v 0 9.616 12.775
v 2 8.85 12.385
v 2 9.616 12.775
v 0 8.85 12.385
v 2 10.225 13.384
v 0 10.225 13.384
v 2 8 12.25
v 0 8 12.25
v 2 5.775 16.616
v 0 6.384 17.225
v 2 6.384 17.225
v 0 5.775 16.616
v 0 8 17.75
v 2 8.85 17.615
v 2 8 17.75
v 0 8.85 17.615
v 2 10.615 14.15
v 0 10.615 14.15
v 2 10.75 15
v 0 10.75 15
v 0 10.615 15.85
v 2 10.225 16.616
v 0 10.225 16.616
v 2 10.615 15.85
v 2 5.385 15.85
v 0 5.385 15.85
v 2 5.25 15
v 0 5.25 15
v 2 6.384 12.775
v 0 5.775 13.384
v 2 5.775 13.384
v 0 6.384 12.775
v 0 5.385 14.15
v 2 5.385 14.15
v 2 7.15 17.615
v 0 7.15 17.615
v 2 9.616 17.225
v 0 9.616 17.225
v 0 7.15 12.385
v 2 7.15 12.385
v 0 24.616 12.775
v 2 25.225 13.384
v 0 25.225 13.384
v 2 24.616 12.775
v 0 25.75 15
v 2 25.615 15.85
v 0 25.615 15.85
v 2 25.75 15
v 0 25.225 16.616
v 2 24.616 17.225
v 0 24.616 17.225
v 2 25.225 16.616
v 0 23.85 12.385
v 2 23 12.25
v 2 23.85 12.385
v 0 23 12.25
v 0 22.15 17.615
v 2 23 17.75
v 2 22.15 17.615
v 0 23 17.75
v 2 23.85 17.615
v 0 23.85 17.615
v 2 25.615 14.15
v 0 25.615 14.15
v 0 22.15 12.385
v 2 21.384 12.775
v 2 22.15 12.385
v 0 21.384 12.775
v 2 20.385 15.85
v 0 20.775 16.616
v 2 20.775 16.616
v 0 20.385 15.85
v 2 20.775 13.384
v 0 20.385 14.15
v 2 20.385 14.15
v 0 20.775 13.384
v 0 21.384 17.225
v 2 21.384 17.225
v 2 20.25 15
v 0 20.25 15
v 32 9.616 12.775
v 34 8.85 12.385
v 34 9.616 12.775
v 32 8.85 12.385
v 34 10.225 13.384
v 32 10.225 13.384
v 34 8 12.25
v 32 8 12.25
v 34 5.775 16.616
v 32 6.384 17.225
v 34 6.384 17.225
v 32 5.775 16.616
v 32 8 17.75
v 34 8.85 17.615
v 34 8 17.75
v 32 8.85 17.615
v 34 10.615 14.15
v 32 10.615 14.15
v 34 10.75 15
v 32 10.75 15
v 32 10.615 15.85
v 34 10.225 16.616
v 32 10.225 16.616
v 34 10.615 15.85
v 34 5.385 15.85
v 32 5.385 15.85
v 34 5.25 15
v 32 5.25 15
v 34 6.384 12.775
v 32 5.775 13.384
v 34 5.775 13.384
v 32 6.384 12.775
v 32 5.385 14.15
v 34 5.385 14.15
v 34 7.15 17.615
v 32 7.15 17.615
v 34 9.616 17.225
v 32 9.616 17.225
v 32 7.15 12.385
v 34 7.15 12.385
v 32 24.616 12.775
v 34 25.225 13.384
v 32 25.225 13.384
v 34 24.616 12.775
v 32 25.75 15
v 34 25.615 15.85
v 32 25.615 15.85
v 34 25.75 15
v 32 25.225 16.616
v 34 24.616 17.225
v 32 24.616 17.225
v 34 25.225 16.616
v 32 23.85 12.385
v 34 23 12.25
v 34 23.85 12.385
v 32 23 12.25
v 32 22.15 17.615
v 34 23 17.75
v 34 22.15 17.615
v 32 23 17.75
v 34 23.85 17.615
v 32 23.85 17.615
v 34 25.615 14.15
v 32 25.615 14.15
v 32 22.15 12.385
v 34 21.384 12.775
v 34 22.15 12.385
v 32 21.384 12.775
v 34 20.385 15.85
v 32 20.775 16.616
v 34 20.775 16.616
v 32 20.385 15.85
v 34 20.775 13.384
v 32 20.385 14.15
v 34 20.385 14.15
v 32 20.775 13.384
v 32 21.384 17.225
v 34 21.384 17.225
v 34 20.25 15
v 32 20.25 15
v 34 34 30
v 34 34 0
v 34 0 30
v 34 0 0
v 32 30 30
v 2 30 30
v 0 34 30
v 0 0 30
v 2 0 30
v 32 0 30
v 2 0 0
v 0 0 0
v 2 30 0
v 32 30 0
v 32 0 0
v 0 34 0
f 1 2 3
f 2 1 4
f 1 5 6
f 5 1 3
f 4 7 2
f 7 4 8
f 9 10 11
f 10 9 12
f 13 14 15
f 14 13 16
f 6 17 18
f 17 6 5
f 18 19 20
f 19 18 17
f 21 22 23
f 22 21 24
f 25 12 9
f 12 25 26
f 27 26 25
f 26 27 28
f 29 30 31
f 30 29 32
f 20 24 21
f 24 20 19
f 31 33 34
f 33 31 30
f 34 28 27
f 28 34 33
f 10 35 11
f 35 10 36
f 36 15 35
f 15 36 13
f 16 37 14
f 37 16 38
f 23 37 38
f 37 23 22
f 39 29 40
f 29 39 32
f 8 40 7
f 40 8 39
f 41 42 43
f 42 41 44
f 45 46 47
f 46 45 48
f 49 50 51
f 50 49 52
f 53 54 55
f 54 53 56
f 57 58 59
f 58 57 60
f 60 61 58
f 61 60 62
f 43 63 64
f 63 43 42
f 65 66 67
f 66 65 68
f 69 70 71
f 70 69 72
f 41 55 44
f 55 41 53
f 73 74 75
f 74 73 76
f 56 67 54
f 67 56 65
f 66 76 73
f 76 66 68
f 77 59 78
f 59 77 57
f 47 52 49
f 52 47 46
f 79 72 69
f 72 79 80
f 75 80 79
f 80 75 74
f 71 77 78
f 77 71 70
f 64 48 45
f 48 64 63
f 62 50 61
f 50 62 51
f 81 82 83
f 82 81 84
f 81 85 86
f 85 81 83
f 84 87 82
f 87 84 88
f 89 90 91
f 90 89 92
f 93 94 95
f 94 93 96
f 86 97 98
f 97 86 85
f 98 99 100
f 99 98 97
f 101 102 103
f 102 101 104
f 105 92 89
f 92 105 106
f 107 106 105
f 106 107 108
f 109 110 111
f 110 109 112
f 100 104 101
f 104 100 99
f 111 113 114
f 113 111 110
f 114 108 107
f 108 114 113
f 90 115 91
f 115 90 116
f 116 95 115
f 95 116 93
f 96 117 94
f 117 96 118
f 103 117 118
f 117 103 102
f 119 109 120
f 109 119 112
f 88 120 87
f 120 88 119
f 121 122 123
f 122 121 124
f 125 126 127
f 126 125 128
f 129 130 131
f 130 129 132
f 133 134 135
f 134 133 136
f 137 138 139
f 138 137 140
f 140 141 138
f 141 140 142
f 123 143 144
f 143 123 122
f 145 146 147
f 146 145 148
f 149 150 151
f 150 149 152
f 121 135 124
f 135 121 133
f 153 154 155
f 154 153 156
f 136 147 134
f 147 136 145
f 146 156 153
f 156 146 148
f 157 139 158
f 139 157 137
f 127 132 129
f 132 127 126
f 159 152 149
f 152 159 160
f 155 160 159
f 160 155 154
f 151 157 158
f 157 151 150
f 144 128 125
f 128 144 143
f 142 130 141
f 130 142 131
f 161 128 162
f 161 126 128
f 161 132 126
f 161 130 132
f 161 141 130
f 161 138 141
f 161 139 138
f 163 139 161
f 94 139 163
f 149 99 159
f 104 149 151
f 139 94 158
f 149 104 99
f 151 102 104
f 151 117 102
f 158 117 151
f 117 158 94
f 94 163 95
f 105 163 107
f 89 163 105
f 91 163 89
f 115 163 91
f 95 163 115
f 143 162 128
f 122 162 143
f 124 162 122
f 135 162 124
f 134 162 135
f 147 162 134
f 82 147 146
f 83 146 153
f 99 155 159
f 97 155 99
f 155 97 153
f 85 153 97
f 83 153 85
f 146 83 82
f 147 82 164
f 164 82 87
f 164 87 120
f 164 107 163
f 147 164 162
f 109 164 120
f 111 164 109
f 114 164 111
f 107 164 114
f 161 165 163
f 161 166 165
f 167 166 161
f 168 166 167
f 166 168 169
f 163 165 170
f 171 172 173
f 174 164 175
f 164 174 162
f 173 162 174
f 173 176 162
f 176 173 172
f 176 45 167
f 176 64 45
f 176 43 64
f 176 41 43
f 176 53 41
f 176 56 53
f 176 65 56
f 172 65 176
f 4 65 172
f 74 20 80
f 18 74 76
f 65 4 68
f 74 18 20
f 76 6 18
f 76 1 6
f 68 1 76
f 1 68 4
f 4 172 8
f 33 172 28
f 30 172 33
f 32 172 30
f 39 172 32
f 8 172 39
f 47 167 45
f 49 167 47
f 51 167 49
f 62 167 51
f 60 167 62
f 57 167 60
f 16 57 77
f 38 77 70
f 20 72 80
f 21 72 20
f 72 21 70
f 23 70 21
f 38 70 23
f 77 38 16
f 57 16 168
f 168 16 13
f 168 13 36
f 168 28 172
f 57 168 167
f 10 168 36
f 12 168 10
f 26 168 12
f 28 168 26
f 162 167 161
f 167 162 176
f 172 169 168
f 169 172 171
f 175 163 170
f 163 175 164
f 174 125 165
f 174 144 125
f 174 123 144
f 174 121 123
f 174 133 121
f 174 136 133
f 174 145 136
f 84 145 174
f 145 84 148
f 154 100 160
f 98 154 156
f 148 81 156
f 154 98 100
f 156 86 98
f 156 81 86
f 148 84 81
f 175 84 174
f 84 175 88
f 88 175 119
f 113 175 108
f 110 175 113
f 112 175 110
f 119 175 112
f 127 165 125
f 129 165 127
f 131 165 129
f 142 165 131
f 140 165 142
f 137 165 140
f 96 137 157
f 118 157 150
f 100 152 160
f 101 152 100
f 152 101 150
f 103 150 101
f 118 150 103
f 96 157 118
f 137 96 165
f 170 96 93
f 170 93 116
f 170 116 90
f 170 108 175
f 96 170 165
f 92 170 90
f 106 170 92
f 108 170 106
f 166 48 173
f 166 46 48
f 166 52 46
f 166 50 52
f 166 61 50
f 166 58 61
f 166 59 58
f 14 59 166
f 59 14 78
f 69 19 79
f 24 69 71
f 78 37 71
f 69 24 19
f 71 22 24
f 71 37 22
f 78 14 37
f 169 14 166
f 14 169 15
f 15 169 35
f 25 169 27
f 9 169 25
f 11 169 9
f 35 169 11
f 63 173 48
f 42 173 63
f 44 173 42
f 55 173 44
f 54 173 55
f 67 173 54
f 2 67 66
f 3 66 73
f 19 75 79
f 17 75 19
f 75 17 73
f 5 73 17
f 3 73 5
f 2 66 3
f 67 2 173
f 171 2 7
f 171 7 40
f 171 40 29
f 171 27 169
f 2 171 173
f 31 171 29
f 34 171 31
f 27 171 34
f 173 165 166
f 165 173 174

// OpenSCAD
// file: ../../parameters.scad
//Main tube diameter - hole [mm]
main_tube_outer_diameter = 25.4;
main_tube_inner_diameter = 23.05;

//Tube for undercarriage - rendered hole [mm]
tube_for_undercarriage_outer_diameter = 10.6;
tube_for_undercarriage_inner_diameter = 6;
global_clearance = 0.5;


// Nastavení parametrů rotoru

gliding_aggle = 14;         // tenhle úhel by se zřejmě v budoucnu měl počítat z požadované klouzavosti.


rotor_blade_AOA = 1.5;      // nastavení úhlu náběhu rotorového listu
rotor_blade_length = 970;   // délka rotorového listu
rotor_blade_depth = 50;     // hloubka rotorového listu

// nastavení parametrů motoru

engine_angle = -8;
engine_diameter = 55;
engine_offset = 55;

engine_screws_radius = 15;
engine_holes_radius = (24 + 44)/4;
engine_shatf_hole_diameter = 13;

// Parameters of tube couplings
coupling_wall_thickness = main_tube_outer_diameter/5;  //width of coupling walls
thickness_between_tubes = main_tube_outer_diameter/10;    // minimum distance between tubes in couplings

coupling_wall_thickness_undercarriage = tube_for_undercarriage_outer_diameter/3;
thickness_between_tubes_undercarriage = tube_for_undercarriage_outer_diameter/10;

608_bearing_outer_diameter = 22.3;
608_bearing_thickness = 7.1;


// screw length step - minimum difference in length between two types of screws
basic_screw_length = 5;


//Screw diameter and nut for M10 [mm]
M10_screw_diameter=10.4;
M10_head_height = 10;
M10_head_diameter = 16+0.5;
M10_nut_height = 10.5;
M10_nut_diameter = 25.5;
M10_nut_pocket = 22.3;

//Screw diameter for M8 [mm]
M8_screw_diameter = 8.6;
M8_head_height = 8;
M8_head_diameter = 13.5;
M8_nut_height = 7.5;
M8_nut_diameter = 14.4 + 0.5;
M8_nut_pocket = 13 + 0.5;

//Screw diameter and nut for M6 [mm]
M6_screw_diameter=6.5;
M6_head_diameter = 10+0.5;
M6_head_height = 6;
M6_nut_height = 4.9;
M6_nut_diameter = 11.8;
M6_nut_pocket = 10.4;

//Screw diameter and nut for M5 [mm]
M5_screw_diameter=5.5;
M5_head_height = 5;
M5_head_diameter = 13+0.5;
M5_nut_height = 4.5;
M5_nut_diameter = 9.4;
M5_nut_pocket = 8.4;

//Screw diameter and nut for M4 [mm]
M4_screw_diameter=4.5;
M4_screw_head_height = 4;
M4_nut_height = 3.2;
M4_nut_diameter = 8.4;
M4_nut_pocket = 7.5;

//Screw diameter and nut for M3 [mm]
M3_screw_diameter = 3.2;
M3_nut_height = 2.7;
M3_nut_diameter = 6.6;
M3_screw_head_height = 3;

//Screw diameter and nut for M2,5 [mm]
M2_5_screw_diameter = 2.7;
M2_5_nut_height = 2.3;
M2_5_nut_diameter = 6;
M2_5_nut_pocket = 5.5;


//šroub servo
Servo_screw = 1.5;

//The tube for help
Help_main_tube_outer = 25;
Help_main_tube_inner = 23;
Help_tube_for_undercarriage_outer = 10;
Help_tube_for_undercarriage_inner = 5;


//main hull parameters

hull_drop_length = 580;
hull_wall_thickness = 0.8;
hull_y_size = 120;
hull_z_size = 150;
hull_x_size = 580;
hull_corner_radius = 4;
hull_airfoil_thickness= 35;  // thickness of drop generating airfoil in percent of length.
hull_scale_x = 1;
hull_scale_y = 1.5;
hull_scale_z = 1.5;

main_pilon_position = 170+68+30;       // pozice rotorového pilonu měřená od přední části krytu
cover_pilon_position = 180;
height_of_vertical_tube = 275; //278mm je změřená délka trubky.

//délka hlavní dlouhé trubky
length_of_main_tube = 820;
length_of_undercarriage_tube = 300;

ribbon_width = 5; // šířka vyztužovacích lemů.

// šířka otvoru v přední části kapoty pro držák motoru.
width_of_engine_holder = 63;

//Top Cover Division - dělení horního krytu pro tisk
top_cover_division = [0, 50, 150, 280, 410, hull_x_size]; // upraveny seznam tak, aby deleni začinalo od nuly, což umožňí úplně automatické rozdělení.

//Bottom Cover Division - dělení dolního krytu pro tisk
bottom_cover_division = [0,100,232.5,365, 470, hull_x_size];
// zkrácená část pro payload pro testovací tisk
//bottom_cover_division = [0,200,250,365, 470, hull_x_size];




rotor_height = height_of_vertical_tube + main_tube_outer_diameter/2 + 2*global_clearance + thickness_between_tubes + 30; // změřená výška rotoru je 367mm
center_of_gravity_position = [main_pilon_position - tan(gliding_aggle)*rotor_height, 0, 0];



//Cover pilon division - na výšku (v ose Z)
cover_pilon_division = [0,170,height_of_vertical_tube + main_tube_outer_diameter + coupling_wall_thickness];

//pozice šroubů
	//horní kryt
top_screw_position = [0,
                    (top_cover_division[0] + top_cover_division[1])/2,
                    (top_cover_division[2] - top_cover_division[1])/2 + top_cover_division[1],
                    (top_cover_division[3] - top_cover_division[2])/2 + top_cover_division[2],
                    (top_cover_division[4] - top_cover_division[3])/8 + top_cover_division[3],
                    (top_cover_division[5] - top_cover_division[4])/2 + top_cover_division[4] - top_cover_division[1]/3];
	//spodní kryt
bottom_screw_position = [0,
                        (bottom_cover_division[0] + bottom_cover_division[1])*(2/6),
                        bottom_cover_division[1]*(9/10),
                        bottom_cover_division[3] + bottom_cover_division[1]*(1/10),
                        bottom_cover_division[3] + bottom_cover_division[1]*(3/5)];




//šířka zámků
lock_width = 10;

//délka zámků
lock_length = 3;


//accumulator
//základní rozměry akumulátoru
width_of_accumulator = 129.4;//45+1;
depth_of_accumulator = 40.61;
height_of_accumulator = 43.65;
//Zapuštění akumulátoru
sink_of_accumulator = 5; //main_tube_outer_diameter/5 - M3_nut_height*1.5;

//tloušťka hrany spojky
accumulator_holder_width = 18;
accumulator_holder_thickness = 10;

//posunutí akumálátoru na podložce
move_of_accumulator = 75;   // pozice akumulátoru (ovlivňuje těžiště)


////////////////
// Senzory
///////////////////

//opticalFlow
width_optical_flow_senzor = 45.5;
depth_optical_flow_senzor = 6;
height_optical_flow_senzor = 35;
sink_of_optical_flow_senzor = depth_optical_flow_senzor - 5;
M3_optical_flow_senzor_Z = 30.4;
M3_optical_flow_senzor_X = 24;
M3_optical_flow_senzor_Z_alone = 9.1;
M3_optical_flow_senzor_X_alone = 16.7;

//GPS anténa
GPS_outer_length = 48.01;   //Vnější rozměr
GPS_inner_length = 37.48;   //Vnitřní rozměr
GPS_diameter = (GPS_outer_length - GPS_inner_length)/2;    //Průměr otvoru
GPS_middle_length = GPS_diameter + GPS_inner_length;      //Střední rozměr


////podzvozek

radius_undercarriage = 25;
vzdalenost_x = tan(20) * 131;
vzdalenost_y = (131 - radius_undercarriage)/tan(79);
uhel_y = 90 - 20;
uhel_x = 90 - 79;

maximum_printable_size = 150;


////Pitotova trubice
Pitot_tube_diameter = 4.02 + 1;
Distance_hole_from_tube = 11.92;  //vzdálenost otvoru pro připevnění od samotné trubičky


////směrové kormidlo
Rudder_length = 4*main_tube_outer_diameter;
Rudder_height = 2*main_tube_outer_diameter;
Rudder_depth = main_tube_outer_diameter/2;
gap_width = 2*hull_wall_thickness;      //šířka mezery mezi směrovkou a ocasní plochou
ruder_shaft_diameter = 2.6; //otočné uchycení směrovky - průměr 2 mm


/////spojka 666_1004

    width_666_1004 = (main_tube_outer_diameter+2*coupling_wall_thickness - M3_screw_head_height)/basic_screw_length;
//        echo("width_666_1004 is", width_666_1004);

//        echo("ceil_666_1004 is", ceil(width_666_1004));

    coupling_screw_length_666_1004 = (ceil(width_666_1004)) * basic_screw_length;
        echo("coupling_screw_length_666_1004 is", coupling_screw_length_666_1004);

    coupling_width_666_1004 = coupling_screw_length_666_1004 + M3_screw_head_height;
//        echo("coupling_width_666_1004 is", coupling_width_666_1004);

    height_666_1004 = coupling_width_666_1004;
//        echo("height_666_1004 is", height_666_1004);

    depth_666_1004 = main_tube_outer_diameter*2+2*coupling_wall_thickness+thickness_between_tubes;
//        echo("depth_666_1004 is", depth_666_1004);

    depth_666_1004_drillhelper = main_tube_outer_diameter*3;

/////spojka 666_1026



    width_666_1026 = main_tube_outer_diameter + 2*thickness_between_tubes;

    depth_666_1026 = (main_tube_outer_diameter*2)/basic_screw_length;
//        echo("depth_666_1026 is", depth_666_1026);

//        echo("ceil_666_1026 is", ceil(depth_666_1026));

    coupling_screw_length_666_1026 = (ceil(depth_666_1026)) * basic_screw_length;
        echo("coupling_screw_length_666_1026 is", coupling_screw_length_666_1026);


    thickness_of_plate = coupling_screw_length_666_1026 - M4_screw_head_height - 50; //50 mm je konstatní šířka spojky 666_1026
    echo("thickness_of_plate is", thickness_of_plate);

    coupling_depth_666_1026 = coupling_screw_length_666_1026 - M4_screw_head_height - thickness_of_plate;      //zde je odečten M4_screw_head_height pro určení šířky, tak aby šroub přesahoval pro potřebnou matku
//        echo("coupling_depth_666_1026 is", coupling_depth_666_1026);

    height_666_1026 = 2*main_tube_outer_diameter;
//        echo("height_666_1026 is", height_666_1026);

//tloušťka plechu pro zajištění konstatní šířky spojky 50 mm

    width_666_1026_drillhelper = main_tube_outer_diameter*2;

    depth_666_1026_drillhelper = main_tube_outer_diameter + 4*thickness_between_tubes;


////spojka 666_1017

    width_666_1017 = (main_tube_outer_diameter + 4*coupling_wall_thickness - M3_screw_head_height)/basic_screw_length;
//        echo("width_666_1017 is", width_666_1017);

//        echo("ceil_666_1017 is", ceil(width_666_1017));

    coupling_screw_length_666_1017 = (ceil(width_666_1017)) * basic_screw_length;
        echo("coupling_screw_length_666_1017 is", coupling_screw_length_666_1017);

    coupling_width_666_1017 = coupling_screw_length_666_1017 + M3_screw_head_height;
//        echo("coupling_width_666_1017 is", coupling_width_666_1017);

    depth_666_1017 = coupling_width_666_1017;

    height_666_1017= 70; //main_tube_outer_diameter*1.8+main_tube_outer_diameter+wall_thickness;

    width_666_1017_drillhelper = main_tube_outer_diameter+4*thickness_between_tubes;

    depth_666_1017_drillhelper = main_tube_outer_diameter*2;


////spojka 666_1014

    width_666_1014 = tube_for_undercarriage_outer_diameter + 2*coupling_wall_thickness_undercarriage;

    depth_666_1014 = tube_for_undercarriage_outer_diameter + M3_screw_diameter + 2*coupling_wall_thickness_undercarriage + thickness_between_tubes_undercarriage;

    height_666_1014 = width_666_1014;


    width_666_1014_drillhelper = 2*tube_for_undercarriage_outer_diameter + 2*coupling_wall_thickness_undercarriage;



////spojka 666_1015

    width_666_1015 = tube_for_undercarriage_outer_diameter + 2*coupling_wall_thickness_undercarriage;

    depth_666_1015 = tube_for_undercarriage_outer_diameter*2 + 2*coupling_wall_thickness_undercarriage + thickness_between_tubes_undercarriage;

    height_666_1015 = width_666_1015;


    width_666_1015_drillhelper = 2*tube_for_undercarriage_outer_diameter + 2*coupling_wall_thickness_undercarriage;

////spojka 666_1016

    width_666_1016 = tube_for_undercarriage_outer_diameter + 2*coupling_wall_thickness_undercarriage;

    depth_666_1016 = tube_for_undercarriage_outer_diameter + M6_screw_diameter + 2*coupling_wall_thickness_undercarriage + thickness_between_tubes_undercarriage;

    height_666_1016 = width_666_1016;


    width_666_1016_drillhelper = 2*tube_for_undercarriage_outer_diameter + 2*coupling_wall_thickness_undercarriage;




//umístění podvozkových trubek

second_undercarriage_hole =height_666_1026 + height_666_1004/2 + 170 + 160;


//Base Divison - dělení podložky
base_division = [0, 159, main_pilon_position + coupling_width_666_1017/2 + global_clearance/2, second_undercarriage_hole + coupling_width_666_1004/2 + global_clearance/2, hull_x_size];

// šrouby pro připevnění podložky k hlavní trubce
base_mounting_screw_length = 50;


// kulove lozisko

bearing_efsm_08_h = 33+1;
bearing_efsm_08_m = 22;
bearing_efsm_08_db = 18;
bearing_efsm_08_ag = 10.5;
bearing_efsm_08_n = M4_screw_diameter;
bearing_efsm_08_a1 = 5.5;
bearing_efsm_08_d = 8.25;
bearing_efsm_08_B = 8; // ball height

bearing_efsm_10_h = 38+1;
bearing_efsm_10_m = 26;
bearing_efsm_10_db = 21.9;
bearing_efsm_10_ag = 12+0.2;
bearing_efsm_10_n = M5_screw_diameter;
bearing_efsm_10_a1 = 6.5;
bearing_efsm_10_d = 10.25;


bearing_efsm_12_width = 40+1;
bearing_efsm_12_h = bearing_efsm_12_width;
bearing_efsm_12_boltd = 28/2; // polovina vzdalenosti mezi srouby
bearing_efsm_12_m = bearing_efsm_12_boltd*2;
bearing_efsm_12_db = 25;
bearing_efsm_12_ag = 13;
bearing_efsm_12_a1 = 7;
bearing_efsm_12_n = M5_screw_diameter;
bearing_efsm_12_d = 12.15;
bearing_efsm_12_B = 10; // ball height
bearing_efsm_space = 1;

bearing_efsm_17_width = 54+1;
bearing_efsm_17_h = bearing_efsm_17_width;
bearing_efsm_17_boltd = 38/2; // polovina vzdalenosti mezi srouby
bearing_efsm_17_m = bearing_efsm_17_boltd*2;
bearing_efsm_17_db = 35;
bearing_efsm_17_ag = 18;
bearing_efsm_17_n = M6_screw_diameter;
bearing_efsm_17_a1 = 10;
bearing_efsm_17_B = 17; // ball height

//limcove lozisko
bearing_EFOM_10_L=26; //celkova sirka zakladny
bearing_EFOM_10_d1=10.3;//diametr otvoru real=10 mm
bearing_EFOM_10_dB=22;//diametr vystupku pro ulozeni lozika
bearing_EFOM_10_H=52;//celková delka zakladny
bearing_EFOM_10_J=36;// hole pitch
bearing_EFOM_10_A1=6.5;//vyska pouzdra
bearing_EFOM_10_Ag=12;//celkova vyska
bearing_EFOM_10_N1=5;//sirka otvoru pro sroub
bearing_EFOM_10_N2=8;//delka otvoru pro sroub
bearing_EFOM_10_m=36;//roztec der pro sroub
bearing_EFOM_10_h=9;//vyska lozika




// 20 KG servo parameters


servo_20kg_axis_offset = 9.375; // jak je osa mimo stredu
servo_20kg_body_x = 42;
servo_20kg_body_y = 21;
servo_20kg_body_z = 40;
servo_20kg_thread_x = 49/2;
servo_20kg_thread_y = 10/2;
servo_20kg_body_below = 10; // jak hluboko je tělo serva pod drzaky na srouby
servo_20kg_below = 25.8; // jak hluboko je páka serva pod drzaky na srouby

servo_20kg_bolt_d = 2.5+0.3;
servo_20kg_nut_d = 5+0.3;



//  888_2***
//    G2
//


g2_0_part_space = 2; // mezera mezi zadni a predni casti

g2_5_height = 608_bearing_outer_diameter*1.5;
g2_5_width = 70+5.5+11;
g2_5_threads = 2; // kolik ma byt sroubu skrz nosnou tyc

g2_5_m3_length = base_mounting_screw_length; // sroub, ktery se pouziva na sesroubovani s nosnou tyci
g2_5_servo_shift = 30;
g2_5_servo_wall = 5;

g2_5_m8_length = 60; // sroub, ktery se pouziva jako osa pro podlozku
g2_5_front_l = main_tube_outer_diameter + 608_bearing_outer_diameter*2;// jak moc ma byt magnet v predu

g2_5_zapusteni_serva = 30;
g2_5_length = g2_5_zapusteni_serva + 2*main_tube_outer_diameter + 30;
g2_5_length_offset = -10;

g2_5_bearing_space = 2; // mezera pro podlozku mezi loziskem a stenou..


g2_0_vertical_bolts = 2;
g2_0_space_btw_wheel_holder = 25.8;

g2_6_plate_thickness = 8;
g2_6_servo_distance = 54; // jak je daleko servo pred tyci kola
g2_6_servo_shift = 0; // jak je osa serva mimo stredu
g2_6_servo_bolt_l = 8; // delka sroubu od konce serva po zacatek matky
g2_6_min_wall_around = 8; // minimalni material okolo serva




// pro dily ze skupiny 3 (888_30**)
g3_0_cone1 = 70;
g3_0_cone2 = 50;
g3_0_cone_height = 25;
g3_0_cone_top_height = 11;
g3_0_height = g3_0_cone_height + 40;
g3_0_bearing_bolt_len = 50;
g3_0_srcew_dist = 55;


// Nastavní volností skupiny dílů 888_30**
// Nastavení rozsahů je v deg
g3_0_pitch_limit = [-20:3:20];
g3_0_roll_limit = [-15:3:15];
g3_0_yaw_limit = [-10:3:10];


//pro zakladnu na strechu auta
g3_1_yaw_width = 75;
g3_1_service_holl_height = 8.4 + 2;
g3_1_service_holl_width = 16 + 1.5;

//pro druhy dil
g3_7_length = maximum_printable_size;
g3_7_width = bearing_efsm_17_width + 2*1+ 2*3;
g3_7_height = M8_screw_diameter*3;

g3_8_magnet_wall_thickness = 7;  // tloustka steny u magnetu
g3_8_bearing_wall_thickness = bearing_efsm_12_ag-bearing_efsm_12_a1;
g3_8_magnet_diameter = 63;
g3_8_cylinder_d = 55; // prumer valce
g3_8_cylinder_h = 30 + g3_8_magnet_wall_thickness;
g3_8_m5_lenght = 40; // delka sroubu pro pridelani kuloveho loziska
g3_8_pocket_wall = g3_8_cylinder_h-(g3_8_m5_lenght-bearing_efsm_12_a1-M5_nut_height-5);

// podlozka na strechu auta
g3_9_height = 145;



servo_20kg_width = 21;   //šřka otvoru pro servo
servo_20kg_height = 42;  //výška otvoru pro servo

//strain gauge
strain_gauge_width = 12.7;
strain_gauge_length = 75.1;
strain_gauge_screw_distance = 10;

//ALU profile
ALU_profile_width = 30;
ALU_profile_holder_wall_thickness = 2;

//ložisko
bearing_outer_diameter = 22;
bearing_inner_diameter = 8;
bearing_height = 7;
// main file
include <../../parameters.scad>



module ALU_profile_holder_top() {
    wall_thickness = ALU_profile_holder_wall_thickness;
    
    module screw_holes() {
        translate([wall_thickness/2, 8, ALU_profile_width/2]) {
            rotate([0, 90, 0]) 
                cylinder(d=M5_screw_diameter, h=wall_thickness*2, center=true, $fn=20);
            
            translate([0, 15, 0])
                rotate([0, 90, 0])
                cylinder(d=M5_screw_diameter, h=wall_thickness*2, center=true, $fn=20);
            
        }
    }
    
    difference() {
        cube([ALU_profile_width+wall_thickness*2, ALU_profile_width+wall_thickness*2, ALU_profile_width]);
        translate([wall_thickness, 0, 0])
            cube([ALU_profile_width, ALU_profile_width, ALU_profile_width]);
        
        screw_holes();
        translate([ALU_profile_width+wall_thickness, 0, 0])
            screw_holes();
    }
}

ALU_profile_holder_top();
